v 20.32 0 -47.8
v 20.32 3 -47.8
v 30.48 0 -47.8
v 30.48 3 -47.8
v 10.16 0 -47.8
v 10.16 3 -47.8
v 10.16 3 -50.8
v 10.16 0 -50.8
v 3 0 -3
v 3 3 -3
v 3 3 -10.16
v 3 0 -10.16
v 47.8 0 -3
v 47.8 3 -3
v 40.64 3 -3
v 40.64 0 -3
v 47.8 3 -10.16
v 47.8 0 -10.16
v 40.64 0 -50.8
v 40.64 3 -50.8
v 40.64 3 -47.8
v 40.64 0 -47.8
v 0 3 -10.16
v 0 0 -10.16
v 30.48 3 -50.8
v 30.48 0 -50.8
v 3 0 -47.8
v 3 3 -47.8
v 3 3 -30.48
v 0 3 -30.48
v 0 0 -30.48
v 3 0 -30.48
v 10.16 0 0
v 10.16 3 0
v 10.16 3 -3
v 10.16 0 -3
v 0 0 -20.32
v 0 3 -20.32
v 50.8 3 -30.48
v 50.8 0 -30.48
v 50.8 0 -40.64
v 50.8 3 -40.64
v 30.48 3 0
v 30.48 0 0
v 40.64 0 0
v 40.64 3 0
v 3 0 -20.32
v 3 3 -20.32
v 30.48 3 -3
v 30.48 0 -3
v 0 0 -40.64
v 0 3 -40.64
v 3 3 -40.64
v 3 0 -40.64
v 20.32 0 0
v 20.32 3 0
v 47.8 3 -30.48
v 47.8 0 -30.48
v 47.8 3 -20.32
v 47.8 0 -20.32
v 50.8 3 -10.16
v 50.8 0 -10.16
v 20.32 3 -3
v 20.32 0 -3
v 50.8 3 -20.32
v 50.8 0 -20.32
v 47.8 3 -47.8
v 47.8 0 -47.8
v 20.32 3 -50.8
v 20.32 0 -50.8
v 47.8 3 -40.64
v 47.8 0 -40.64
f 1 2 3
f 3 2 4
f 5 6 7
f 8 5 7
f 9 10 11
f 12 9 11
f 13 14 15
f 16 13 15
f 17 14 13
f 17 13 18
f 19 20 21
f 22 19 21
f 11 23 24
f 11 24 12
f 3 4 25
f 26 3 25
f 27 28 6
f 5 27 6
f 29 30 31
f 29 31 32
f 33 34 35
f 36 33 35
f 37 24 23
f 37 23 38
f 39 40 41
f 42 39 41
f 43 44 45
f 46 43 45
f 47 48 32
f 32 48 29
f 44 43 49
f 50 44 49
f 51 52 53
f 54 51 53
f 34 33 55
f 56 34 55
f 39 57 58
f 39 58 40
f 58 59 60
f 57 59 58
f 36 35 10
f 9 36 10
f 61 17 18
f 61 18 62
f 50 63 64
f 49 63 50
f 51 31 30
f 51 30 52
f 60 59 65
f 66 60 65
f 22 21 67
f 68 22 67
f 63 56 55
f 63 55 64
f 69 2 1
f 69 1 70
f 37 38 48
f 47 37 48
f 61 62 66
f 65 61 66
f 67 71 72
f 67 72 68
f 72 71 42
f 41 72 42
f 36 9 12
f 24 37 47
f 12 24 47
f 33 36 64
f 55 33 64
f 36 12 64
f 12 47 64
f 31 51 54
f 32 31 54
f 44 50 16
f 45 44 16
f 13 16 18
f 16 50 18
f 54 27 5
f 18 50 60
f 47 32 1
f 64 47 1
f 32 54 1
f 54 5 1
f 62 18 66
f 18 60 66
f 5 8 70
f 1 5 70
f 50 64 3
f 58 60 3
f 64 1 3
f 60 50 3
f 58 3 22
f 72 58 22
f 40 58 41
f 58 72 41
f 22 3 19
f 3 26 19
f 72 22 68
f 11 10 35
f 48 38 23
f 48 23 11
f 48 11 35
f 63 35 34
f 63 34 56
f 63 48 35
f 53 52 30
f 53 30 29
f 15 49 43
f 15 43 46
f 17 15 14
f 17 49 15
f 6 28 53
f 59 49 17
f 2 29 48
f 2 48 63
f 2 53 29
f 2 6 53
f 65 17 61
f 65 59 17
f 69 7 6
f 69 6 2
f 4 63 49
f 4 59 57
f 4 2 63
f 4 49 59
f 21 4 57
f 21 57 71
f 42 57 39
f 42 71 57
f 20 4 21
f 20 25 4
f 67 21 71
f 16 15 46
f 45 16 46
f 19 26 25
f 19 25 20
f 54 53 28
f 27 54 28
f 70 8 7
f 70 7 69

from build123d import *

# Parameters (mm, degrees)
SKETCH1_W           = 50.8
SKETCH1_H           = 50.8
BOSS_EXTRUDE1_DEPTH = 3
SKETCH2_W           = 10.16
SKETCH2_H           = 3
SKETCH2_W_2         = 3
SKETCH2_H_2         = 10.16
CUT_EXTRUDE1_DEPTH  = 72.904659098


with BuildPart() as part:
    # Sketch1 → Boss-Extrude1 (new body)
    with BuildSketch(Plane(origin=(0, 0, 0), x_dir=(1, 0, 0), z_dir=(0, 1, 0))):
        with Locations((25.4, 25.4)):
            Rectangle(SKETCH1_W, SKETCH1_H)
    extrude(amount=BOSS_EXTRUDE1_DEPTH)

    # Sketch2 → Cut-Extrude1 (cut, through all)
    with BuildSketch(Plane(origin=(0, 3, 0), x_dir=(1, 0, 0), z_dir=(0, 1, 0))):
        Polygon((50.8, 50.8), (40.64, 50.8), (40.64, 47.8), (47.8, 47.8), (47.8, 40.64), (50.8, 40.64), align=None)
        with Locations((25.4, 49.3)):
            Rectangle(SKETCH2_W, SKETCH2_H)
        Polygon((10.16, 47.8), (10.16, 50.8), (0, 50.8), (0, 40.64), (3, 40.64), (3, 47.8), align=None)
        with Locations((49.3, 25.4)):
            Rectangle(SKETCH2_W_2, SKETCH2_H_2)
        Polygon((50.8, 10.16), (47.8, 10.16), (47.8, 3), (40.64, 3), (40.64, 0), (50.8, 0), align=None)
        with Locations((1.5, 25.4)):
            Rectangle(SKETCH2_W_2, SKETCH2_H_2)
        Polygon((3, 10.16), (0, 10.16), (0, 0), (10.16, 0), (10.16, 3), (3, 3), align=None)
        with Locations((25.4, 1.5)):
            Rectangle(SKETCH2_W, SKETCH2_H)
    extrude(amount=-CUT_EXTRUDE1_DEPTH, mode=Mode.SUBTRACT)


solid = part.part
